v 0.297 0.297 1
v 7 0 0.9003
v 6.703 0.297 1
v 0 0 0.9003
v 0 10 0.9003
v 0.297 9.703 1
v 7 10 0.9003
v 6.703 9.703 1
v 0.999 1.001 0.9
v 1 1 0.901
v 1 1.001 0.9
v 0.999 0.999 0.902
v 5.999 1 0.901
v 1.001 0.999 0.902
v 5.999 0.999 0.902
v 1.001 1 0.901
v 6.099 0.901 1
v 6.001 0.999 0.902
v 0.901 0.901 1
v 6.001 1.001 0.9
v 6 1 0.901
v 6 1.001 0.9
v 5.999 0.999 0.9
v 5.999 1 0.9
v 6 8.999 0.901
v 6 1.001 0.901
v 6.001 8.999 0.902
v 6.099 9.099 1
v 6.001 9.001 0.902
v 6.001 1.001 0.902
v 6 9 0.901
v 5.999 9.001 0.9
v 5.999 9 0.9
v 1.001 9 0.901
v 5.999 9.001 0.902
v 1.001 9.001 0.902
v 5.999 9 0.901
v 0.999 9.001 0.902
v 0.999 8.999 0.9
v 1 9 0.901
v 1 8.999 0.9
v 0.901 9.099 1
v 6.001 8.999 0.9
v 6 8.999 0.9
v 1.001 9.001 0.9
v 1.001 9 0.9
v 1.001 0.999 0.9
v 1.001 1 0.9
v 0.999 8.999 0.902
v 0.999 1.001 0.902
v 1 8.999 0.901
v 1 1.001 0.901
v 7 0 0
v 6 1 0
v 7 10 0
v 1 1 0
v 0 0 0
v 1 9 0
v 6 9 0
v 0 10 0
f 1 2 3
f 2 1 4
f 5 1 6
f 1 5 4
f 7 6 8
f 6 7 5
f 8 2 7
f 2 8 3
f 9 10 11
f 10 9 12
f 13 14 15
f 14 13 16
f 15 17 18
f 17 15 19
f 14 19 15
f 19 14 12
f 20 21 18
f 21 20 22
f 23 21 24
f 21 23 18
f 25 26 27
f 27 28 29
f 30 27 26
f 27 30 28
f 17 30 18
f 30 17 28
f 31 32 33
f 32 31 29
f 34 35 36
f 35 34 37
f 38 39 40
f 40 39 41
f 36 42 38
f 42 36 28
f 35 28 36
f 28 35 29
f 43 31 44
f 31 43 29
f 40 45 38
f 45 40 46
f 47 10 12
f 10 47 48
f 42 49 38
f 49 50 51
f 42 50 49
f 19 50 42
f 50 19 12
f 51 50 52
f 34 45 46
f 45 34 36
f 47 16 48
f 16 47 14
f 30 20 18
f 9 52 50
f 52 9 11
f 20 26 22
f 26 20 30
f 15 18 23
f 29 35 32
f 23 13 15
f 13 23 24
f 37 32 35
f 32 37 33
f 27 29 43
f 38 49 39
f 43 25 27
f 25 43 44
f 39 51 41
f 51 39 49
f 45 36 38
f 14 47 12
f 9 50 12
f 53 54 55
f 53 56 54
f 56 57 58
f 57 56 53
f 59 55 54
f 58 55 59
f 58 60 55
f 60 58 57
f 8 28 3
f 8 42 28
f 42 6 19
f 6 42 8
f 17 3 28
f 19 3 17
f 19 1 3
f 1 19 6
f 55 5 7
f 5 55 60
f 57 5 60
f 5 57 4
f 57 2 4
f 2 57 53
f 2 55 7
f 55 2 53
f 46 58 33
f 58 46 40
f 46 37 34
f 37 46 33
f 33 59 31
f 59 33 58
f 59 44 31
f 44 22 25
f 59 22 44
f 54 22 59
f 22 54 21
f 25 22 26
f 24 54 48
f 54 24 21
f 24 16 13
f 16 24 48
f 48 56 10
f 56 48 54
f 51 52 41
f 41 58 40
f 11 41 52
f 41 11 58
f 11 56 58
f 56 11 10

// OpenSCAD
//==============================================================================
//
//           prism-chamfer - the missing chamfer tool for OpenSCAD
//
// Author:  Heath Raftery
// Origin:  http://github.com/hraftery/prism-chamfer
// License: GPLv3, see LICENSE for terms.
//
// See the accompanying README for instructions on use.
//
//==============================================================================


include <../prism-chamfer.scad>;

difference() {
  polygon_points = [[0,0],[0,10],[7,10],[7,0],[3.5,0],[3.5,1],[6,1],[6,9],[1,9],[1,1],[3.5,1],[3.5,0]];
  h=1;
  linear_extrude(height=h)
    polygon(polygon_points, convexity=4);

  //Outer
  prism_chamfer_mask(polygon_points, -1, 3, h,
                     0.3, 0.1);
  //Inner
  prism_chamfer_mask(polygon_points, 5, 9, h,
                     0.1, 0, "deep");
}
